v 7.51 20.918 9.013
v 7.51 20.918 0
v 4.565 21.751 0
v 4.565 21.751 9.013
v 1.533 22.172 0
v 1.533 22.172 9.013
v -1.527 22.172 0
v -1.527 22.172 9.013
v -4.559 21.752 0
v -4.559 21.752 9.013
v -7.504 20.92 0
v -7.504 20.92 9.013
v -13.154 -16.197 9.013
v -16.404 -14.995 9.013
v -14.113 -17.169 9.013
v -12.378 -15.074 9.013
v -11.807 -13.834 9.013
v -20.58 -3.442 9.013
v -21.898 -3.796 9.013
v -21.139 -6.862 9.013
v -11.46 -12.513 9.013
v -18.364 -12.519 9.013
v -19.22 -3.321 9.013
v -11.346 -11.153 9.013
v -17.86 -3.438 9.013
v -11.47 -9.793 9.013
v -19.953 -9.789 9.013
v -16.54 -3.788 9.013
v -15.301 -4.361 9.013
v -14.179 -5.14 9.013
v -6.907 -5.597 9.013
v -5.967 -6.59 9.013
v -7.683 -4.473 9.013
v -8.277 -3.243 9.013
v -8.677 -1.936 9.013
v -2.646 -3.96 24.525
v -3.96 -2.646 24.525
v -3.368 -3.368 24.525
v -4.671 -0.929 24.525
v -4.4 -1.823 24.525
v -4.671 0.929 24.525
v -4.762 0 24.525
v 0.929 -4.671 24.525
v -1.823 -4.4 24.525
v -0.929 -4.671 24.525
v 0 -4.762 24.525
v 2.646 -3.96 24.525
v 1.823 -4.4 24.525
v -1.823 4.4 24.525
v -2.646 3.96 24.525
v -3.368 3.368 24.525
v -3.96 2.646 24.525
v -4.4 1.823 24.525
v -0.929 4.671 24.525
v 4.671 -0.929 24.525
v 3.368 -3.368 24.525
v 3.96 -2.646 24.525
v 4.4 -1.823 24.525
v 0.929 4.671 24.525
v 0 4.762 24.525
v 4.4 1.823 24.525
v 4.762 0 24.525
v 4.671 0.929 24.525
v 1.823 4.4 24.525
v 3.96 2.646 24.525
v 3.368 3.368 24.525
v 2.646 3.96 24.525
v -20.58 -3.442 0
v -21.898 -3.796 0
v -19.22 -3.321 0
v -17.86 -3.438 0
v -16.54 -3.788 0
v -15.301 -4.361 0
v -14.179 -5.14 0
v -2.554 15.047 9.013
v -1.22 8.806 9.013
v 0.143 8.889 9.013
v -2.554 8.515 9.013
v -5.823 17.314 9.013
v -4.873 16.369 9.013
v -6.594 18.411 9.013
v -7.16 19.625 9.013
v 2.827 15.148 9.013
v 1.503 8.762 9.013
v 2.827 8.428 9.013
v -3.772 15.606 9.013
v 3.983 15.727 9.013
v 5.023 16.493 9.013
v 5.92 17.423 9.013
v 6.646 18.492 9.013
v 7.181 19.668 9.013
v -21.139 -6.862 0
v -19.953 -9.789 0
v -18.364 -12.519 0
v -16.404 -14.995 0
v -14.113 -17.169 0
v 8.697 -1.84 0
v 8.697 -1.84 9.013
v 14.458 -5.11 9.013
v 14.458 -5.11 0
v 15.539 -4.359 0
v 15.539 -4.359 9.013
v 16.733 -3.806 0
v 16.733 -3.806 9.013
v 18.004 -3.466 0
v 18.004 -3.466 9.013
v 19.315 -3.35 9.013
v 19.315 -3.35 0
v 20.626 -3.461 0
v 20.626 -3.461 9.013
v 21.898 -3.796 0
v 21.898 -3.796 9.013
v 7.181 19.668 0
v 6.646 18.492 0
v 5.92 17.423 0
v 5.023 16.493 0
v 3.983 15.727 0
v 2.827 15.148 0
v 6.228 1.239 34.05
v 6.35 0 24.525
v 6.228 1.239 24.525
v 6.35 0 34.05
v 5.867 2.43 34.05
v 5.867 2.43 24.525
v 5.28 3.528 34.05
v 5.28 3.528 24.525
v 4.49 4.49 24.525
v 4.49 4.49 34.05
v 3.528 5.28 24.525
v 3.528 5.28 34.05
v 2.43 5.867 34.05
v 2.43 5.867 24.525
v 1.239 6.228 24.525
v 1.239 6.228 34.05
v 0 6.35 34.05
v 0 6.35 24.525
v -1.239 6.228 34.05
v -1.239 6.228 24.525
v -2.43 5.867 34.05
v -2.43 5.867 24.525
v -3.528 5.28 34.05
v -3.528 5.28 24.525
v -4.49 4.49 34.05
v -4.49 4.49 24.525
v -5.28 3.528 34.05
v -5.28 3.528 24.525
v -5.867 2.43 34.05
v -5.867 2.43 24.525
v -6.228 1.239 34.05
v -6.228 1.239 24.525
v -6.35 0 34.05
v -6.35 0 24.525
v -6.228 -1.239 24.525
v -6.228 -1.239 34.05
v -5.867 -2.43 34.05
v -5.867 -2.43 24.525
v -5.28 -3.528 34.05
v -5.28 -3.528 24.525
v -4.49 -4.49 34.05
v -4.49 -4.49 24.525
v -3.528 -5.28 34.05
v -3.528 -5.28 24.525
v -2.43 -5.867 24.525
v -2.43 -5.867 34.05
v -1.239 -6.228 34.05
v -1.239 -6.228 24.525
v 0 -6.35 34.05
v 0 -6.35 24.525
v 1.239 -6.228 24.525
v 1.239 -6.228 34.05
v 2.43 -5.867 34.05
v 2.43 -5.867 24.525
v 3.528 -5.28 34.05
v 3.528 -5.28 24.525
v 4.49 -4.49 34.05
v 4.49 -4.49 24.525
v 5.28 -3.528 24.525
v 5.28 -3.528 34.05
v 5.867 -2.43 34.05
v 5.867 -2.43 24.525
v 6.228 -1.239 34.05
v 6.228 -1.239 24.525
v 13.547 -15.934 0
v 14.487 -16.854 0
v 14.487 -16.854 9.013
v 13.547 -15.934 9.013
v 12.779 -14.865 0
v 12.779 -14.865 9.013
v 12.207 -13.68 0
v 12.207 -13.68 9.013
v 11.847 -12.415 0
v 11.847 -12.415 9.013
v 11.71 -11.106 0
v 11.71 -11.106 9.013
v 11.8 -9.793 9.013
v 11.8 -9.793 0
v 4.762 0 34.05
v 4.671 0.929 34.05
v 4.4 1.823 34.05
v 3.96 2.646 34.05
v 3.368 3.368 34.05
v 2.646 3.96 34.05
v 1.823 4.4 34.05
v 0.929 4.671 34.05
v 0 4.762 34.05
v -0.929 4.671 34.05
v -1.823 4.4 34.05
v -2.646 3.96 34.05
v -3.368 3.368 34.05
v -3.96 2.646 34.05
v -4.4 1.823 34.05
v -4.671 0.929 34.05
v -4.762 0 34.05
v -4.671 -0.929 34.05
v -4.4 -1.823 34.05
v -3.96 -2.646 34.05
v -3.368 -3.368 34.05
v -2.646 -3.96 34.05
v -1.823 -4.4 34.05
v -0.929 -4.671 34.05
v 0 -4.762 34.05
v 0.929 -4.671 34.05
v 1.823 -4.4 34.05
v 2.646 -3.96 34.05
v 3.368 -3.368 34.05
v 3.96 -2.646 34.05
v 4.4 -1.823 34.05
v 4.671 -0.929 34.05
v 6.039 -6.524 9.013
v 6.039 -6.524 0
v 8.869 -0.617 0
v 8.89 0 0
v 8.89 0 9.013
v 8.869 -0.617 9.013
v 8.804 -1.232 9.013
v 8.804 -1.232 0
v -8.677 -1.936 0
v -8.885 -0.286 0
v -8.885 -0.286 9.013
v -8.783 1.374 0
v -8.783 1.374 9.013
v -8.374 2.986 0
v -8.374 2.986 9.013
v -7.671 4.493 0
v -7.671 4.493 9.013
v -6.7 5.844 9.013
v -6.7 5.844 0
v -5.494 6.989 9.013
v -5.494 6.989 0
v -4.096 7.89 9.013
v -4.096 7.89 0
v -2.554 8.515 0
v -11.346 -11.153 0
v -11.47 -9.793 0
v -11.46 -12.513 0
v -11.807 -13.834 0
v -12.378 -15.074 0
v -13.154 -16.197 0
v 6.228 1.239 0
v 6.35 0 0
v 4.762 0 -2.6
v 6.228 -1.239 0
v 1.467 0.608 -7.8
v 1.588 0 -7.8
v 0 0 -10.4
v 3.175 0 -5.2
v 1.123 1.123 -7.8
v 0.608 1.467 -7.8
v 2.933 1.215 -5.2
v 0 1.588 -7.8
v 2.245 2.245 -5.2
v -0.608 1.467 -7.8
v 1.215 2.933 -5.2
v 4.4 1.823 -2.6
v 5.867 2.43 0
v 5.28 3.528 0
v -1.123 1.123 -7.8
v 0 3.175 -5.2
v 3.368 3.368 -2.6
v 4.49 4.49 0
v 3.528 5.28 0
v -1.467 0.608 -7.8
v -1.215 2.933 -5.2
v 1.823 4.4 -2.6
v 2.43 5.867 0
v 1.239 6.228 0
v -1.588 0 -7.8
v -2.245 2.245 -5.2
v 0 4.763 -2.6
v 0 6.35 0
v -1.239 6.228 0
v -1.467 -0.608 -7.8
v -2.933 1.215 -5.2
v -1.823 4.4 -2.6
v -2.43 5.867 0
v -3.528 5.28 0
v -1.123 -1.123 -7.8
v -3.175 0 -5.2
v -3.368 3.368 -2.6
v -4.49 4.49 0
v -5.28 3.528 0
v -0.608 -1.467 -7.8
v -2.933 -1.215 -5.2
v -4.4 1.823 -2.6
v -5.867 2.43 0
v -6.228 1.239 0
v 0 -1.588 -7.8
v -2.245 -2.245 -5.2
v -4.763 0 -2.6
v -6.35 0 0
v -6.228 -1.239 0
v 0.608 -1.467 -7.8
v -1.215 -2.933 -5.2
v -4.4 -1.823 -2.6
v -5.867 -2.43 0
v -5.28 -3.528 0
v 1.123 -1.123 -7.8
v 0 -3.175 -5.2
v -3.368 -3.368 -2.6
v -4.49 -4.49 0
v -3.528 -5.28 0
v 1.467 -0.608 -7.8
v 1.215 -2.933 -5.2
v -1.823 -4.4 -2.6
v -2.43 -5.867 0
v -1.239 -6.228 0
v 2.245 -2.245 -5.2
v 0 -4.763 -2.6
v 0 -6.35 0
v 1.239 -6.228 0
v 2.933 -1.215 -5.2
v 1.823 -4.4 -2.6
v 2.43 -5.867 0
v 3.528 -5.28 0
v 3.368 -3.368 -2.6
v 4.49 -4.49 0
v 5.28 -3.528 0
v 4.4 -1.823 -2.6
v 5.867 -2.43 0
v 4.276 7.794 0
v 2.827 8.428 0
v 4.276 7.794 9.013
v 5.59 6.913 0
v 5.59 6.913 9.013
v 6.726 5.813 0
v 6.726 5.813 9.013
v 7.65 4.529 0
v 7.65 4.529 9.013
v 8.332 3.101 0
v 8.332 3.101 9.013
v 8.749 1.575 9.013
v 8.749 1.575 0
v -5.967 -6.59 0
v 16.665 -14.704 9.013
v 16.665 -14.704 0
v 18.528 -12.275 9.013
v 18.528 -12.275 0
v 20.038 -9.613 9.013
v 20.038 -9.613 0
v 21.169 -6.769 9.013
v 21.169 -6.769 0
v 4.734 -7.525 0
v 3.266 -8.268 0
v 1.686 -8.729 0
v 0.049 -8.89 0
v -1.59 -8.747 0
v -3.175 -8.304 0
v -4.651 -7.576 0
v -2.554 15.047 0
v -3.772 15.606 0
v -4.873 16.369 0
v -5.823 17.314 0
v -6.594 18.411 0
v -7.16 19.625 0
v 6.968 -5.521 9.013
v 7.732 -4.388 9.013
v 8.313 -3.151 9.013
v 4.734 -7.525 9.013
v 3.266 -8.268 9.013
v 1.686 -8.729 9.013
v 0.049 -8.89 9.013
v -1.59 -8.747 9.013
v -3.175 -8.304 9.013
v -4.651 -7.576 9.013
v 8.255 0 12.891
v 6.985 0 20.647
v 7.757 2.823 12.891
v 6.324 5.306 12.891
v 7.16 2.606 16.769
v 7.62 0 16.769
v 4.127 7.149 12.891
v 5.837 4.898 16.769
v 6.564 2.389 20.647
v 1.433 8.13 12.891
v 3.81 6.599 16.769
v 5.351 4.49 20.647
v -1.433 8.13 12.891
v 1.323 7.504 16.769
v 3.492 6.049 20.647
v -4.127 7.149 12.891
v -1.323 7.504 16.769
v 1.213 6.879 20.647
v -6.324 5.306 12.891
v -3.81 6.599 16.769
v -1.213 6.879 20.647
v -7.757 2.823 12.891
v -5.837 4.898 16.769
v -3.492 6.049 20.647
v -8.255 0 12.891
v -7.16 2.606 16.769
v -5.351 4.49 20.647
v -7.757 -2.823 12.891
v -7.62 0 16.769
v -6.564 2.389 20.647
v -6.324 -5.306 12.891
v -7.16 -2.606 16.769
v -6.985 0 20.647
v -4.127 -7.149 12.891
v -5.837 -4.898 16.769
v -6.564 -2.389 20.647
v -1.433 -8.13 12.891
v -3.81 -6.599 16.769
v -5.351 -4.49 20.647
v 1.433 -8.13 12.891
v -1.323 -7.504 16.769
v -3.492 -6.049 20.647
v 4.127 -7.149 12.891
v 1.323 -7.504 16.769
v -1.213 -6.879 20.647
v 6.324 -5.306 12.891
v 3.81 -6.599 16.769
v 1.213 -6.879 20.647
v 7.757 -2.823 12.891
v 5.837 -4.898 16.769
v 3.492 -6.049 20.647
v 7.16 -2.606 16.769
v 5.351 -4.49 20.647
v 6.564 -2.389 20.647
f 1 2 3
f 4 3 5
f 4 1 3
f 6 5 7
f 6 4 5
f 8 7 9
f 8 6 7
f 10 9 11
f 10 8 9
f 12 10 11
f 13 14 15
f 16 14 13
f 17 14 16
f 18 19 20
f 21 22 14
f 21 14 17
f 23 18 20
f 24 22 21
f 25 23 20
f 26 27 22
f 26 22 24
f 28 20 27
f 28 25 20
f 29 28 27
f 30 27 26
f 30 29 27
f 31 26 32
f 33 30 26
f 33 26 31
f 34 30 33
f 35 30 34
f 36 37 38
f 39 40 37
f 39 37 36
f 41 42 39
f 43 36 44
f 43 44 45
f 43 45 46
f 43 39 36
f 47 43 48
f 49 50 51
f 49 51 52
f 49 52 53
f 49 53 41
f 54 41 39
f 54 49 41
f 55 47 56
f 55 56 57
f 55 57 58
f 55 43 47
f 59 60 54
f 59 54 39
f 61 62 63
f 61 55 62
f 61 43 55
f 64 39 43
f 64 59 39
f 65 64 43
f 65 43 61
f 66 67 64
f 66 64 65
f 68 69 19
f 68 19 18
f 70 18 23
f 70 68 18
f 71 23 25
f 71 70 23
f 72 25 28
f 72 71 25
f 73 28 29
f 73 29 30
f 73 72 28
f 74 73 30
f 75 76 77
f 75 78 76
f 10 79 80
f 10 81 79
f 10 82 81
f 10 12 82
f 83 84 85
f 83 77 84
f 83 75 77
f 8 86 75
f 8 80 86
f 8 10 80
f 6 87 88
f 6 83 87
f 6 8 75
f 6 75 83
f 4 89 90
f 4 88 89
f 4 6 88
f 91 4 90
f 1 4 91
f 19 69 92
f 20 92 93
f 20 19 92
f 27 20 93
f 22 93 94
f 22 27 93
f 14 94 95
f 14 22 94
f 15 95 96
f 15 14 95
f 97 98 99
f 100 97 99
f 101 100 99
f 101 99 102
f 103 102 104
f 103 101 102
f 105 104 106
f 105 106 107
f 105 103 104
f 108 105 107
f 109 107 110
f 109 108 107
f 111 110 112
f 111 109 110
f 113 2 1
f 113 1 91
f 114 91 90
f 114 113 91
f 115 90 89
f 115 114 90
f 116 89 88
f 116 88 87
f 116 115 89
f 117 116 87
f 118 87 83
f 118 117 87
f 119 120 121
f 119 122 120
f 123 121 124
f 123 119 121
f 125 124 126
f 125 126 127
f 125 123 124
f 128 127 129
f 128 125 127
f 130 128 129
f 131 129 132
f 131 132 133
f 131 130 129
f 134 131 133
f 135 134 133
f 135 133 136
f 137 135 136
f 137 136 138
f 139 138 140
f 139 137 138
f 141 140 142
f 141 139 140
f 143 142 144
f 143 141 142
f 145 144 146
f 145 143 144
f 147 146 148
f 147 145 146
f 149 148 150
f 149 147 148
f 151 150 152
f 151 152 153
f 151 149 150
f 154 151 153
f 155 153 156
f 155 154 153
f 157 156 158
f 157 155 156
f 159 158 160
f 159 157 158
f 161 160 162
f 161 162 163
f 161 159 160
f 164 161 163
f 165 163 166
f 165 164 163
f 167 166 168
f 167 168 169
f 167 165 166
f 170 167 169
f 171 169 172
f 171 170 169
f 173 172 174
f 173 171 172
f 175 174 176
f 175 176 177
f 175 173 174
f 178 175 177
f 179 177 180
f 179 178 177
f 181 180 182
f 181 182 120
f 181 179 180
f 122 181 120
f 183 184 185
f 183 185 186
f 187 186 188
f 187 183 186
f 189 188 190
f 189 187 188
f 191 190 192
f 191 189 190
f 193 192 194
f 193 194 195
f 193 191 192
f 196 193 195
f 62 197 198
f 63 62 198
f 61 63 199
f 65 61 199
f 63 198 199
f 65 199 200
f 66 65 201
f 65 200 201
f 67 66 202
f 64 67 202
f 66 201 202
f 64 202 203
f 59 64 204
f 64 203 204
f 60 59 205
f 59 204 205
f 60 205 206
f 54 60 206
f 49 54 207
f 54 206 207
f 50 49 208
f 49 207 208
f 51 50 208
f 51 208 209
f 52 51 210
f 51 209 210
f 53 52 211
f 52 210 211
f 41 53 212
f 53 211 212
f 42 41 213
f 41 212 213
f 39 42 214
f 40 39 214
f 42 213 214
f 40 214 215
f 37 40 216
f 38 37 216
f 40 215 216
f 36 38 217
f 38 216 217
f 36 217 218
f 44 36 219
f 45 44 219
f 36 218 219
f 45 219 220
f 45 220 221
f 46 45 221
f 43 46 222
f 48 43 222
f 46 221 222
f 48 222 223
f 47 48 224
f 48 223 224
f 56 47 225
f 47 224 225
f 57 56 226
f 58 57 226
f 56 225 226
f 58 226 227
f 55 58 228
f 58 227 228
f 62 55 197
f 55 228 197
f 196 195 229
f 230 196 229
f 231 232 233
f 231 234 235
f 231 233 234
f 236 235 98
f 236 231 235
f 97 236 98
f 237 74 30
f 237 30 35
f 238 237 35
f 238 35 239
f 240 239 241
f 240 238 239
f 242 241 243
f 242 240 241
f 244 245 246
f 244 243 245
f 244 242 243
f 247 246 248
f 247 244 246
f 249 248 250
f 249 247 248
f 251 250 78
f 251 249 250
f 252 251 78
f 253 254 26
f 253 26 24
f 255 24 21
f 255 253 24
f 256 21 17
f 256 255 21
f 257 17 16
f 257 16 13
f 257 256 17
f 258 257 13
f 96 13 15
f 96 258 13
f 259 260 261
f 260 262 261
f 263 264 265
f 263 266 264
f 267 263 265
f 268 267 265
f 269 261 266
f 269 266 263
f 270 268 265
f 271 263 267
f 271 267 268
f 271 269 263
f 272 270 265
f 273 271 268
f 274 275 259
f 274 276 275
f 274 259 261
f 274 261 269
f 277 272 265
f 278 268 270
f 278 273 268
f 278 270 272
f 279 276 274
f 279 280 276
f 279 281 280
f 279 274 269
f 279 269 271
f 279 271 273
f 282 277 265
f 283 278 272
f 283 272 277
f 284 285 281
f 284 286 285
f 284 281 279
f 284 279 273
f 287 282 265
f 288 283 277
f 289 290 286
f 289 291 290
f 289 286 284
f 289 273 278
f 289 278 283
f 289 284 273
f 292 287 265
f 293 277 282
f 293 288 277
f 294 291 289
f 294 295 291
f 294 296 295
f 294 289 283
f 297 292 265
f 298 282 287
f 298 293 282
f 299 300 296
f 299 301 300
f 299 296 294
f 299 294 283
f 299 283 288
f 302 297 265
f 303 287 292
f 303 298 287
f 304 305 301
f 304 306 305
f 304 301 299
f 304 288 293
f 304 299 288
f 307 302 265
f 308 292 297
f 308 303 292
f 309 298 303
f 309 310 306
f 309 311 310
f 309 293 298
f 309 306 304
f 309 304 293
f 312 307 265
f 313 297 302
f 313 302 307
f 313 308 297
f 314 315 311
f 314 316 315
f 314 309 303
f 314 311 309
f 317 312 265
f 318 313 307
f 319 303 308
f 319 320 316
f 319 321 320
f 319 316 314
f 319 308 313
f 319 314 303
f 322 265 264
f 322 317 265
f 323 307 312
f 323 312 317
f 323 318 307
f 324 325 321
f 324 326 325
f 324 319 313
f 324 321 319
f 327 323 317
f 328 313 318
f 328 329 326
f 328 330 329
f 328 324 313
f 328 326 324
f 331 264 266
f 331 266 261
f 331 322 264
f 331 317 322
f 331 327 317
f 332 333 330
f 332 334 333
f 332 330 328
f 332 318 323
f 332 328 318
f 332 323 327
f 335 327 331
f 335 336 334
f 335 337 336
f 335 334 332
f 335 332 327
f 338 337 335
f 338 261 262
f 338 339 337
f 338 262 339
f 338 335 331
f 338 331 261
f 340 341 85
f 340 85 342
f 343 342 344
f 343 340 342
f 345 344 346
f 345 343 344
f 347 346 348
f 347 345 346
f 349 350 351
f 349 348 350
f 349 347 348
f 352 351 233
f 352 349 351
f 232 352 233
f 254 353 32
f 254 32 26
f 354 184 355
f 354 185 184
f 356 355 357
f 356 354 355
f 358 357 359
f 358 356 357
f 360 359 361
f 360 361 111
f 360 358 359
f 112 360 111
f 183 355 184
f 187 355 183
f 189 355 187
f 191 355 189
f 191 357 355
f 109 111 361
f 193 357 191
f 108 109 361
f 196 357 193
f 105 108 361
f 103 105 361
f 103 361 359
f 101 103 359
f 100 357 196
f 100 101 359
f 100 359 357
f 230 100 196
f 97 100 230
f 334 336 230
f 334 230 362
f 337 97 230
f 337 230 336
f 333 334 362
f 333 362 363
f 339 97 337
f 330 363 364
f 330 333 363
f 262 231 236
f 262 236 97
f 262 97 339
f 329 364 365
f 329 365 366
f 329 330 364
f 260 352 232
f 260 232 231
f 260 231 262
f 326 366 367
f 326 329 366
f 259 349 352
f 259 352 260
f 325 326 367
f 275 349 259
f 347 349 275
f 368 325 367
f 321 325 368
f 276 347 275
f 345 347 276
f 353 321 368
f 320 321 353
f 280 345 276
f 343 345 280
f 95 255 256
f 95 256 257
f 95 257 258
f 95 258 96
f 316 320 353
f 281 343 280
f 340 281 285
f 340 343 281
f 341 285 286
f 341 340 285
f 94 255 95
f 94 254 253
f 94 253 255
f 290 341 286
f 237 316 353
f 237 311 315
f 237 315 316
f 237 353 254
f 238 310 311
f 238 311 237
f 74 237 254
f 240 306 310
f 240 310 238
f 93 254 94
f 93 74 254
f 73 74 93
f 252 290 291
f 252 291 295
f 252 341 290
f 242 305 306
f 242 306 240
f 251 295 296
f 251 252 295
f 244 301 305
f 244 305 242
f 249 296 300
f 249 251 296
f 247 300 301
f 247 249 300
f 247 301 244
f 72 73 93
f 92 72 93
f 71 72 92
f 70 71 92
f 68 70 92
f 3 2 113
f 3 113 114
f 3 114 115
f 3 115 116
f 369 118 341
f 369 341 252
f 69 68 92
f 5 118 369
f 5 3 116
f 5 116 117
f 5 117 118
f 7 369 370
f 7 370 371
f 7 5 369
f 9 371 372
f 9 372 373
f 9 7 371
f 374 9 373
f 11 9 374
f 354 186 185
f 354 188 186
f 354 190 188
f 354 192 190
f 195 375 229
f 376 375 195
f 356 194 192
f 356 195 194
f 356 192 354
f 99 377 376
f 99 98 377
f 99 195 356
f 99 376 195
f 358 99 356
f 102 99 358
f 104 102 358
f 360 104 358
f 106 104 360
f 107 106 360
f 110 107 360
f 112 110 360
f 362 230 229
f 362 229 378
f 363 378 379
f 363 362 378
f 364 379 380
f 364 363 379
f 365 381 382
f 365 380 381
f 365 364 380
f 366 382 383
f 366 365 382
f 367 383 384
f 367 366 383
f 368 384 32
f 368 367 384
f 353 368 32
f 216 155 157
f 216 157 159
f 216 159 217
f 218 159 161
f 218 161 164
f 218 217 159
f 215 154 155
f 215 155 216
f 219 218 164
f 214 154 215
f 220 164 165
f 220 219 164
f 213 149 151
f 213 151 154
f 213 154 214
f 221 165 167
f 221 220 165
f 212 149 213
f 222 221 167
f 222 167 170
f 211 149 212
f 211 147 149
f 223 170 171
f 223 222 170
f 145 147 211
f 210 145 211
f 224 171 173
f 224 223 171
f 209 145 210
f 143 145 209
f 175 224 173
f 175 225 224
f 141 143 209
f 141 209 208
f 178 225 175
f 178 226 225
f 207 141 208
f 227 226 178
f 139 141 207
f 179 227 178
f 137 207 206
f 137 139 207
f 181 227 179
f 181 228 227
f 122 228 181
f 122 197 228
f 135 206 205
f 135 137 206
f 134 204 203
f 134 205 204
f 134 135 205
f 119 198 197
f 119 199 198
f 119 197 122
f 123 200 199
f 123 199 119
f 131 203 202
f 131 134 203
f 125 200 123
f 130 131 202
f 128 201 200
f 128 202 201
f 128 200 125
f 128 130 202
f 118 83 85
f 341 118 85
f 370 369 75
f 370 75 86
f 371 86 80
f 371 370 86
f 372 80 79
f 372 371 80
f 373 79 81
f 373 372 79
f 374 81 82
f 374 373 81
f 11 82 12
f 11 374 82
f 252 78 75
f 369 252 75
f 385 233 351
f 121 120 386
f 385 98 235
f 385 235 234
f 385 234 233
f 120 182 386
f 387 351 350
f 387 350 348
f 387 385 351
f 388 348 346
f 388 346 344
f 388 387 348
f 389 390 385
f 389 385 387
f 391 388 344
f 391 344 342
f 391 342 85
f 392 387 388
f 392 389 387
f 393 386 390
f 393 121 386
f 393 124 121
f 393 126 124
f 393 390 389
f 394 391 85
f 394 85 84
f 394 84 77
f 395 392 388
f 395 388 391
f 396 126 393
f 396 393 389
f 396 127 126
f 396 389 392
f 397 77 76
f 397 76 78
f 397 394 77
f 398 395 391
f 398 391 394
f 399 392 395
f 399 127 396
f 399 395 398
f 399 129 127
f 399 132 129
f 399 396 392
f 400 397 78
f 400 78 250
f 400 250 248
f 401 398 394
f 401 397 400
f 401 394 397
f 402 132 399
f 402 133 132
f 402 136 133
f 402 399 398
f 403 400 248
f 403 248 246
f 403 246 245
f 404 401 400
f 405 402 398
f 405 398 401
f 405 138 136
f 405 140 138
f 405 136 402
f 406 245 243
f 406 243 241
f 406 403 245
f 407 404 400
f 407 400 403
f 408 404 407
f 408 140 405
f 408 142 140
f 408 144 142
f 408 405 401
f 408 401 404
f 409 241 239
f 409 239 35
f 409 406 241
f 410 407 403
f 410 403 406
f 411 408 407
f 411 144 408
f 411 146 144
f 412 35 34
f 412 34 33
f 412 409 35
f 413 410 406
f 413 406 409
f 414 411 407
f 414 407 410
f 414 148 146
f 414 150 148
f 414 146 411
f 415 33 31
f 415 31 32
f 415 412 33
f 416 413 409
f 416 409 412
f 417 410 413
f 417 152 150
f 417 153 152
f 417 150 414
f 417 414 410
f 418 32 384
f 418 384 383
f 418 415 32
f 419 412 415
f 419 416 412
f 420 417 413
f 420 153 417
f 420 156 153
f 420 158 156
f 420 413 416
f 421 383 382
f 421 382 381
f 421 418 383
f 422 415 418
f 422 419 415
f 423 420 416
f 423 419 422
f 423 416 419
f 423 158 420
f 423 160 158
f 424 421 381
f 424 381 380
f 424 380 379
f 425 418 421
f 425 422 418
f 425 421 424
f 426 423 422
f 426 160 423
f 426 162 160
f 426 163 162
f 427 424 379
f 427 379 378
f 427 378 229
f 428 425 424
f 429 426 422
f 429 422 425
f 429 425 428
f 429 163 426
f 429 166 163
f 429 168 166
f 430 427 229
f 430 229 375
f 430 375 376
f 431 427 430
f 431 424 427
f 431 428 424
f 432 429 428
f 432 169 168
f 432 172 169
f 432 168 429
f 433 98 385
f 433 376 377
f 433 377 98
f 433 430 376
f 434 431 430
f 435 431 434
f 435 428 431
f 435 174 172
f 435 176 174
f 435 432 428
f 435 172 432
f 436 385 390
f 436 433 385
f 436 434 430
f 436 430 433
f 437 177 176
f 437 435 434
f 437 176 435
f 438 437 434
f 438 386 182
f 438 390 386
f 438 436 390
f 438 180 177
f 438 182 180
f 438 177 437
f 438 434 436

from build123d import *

# Parameters (mm, degrees)
F3_DEPTH = 14.097
F4_R     = 4.7625
F5_DEPTH = 9.525


with BuildPart() as f1:
    # F0 (on Front) → F1 (revolve)
    with BuildSketch(Plane.XZ):
        Polygon((6.35, 24.5250865847), (6.35, 34.0500865847), (0, 34.0500865847), (0, -10.3999134153), (6.35, 0), (22.225, 0), (22.225, 9.0132579207), (8.8899998294, 9.0132579207), align=None)
    revolve(axis=Axis((0, 0, 11.8250865847), (0, 0, 1)))

    # F2 (on Top) → F3 (cut)
    with BuildSketch(Plane.XY):
        with BuildLine():
            ThreePointArc((-14.113121628, -17.1688794892), (0.2443956371, -22.2236562197), (14.487278372, -16.8543582011))
            ThreePointArc((14.487278372, -16.8543582011), (12.207059324, -13.6802064233), (11.8003316443, -9.7931495662))
            Line((11.8003316443, -9.7931495662), (6.0394839652, -6.5235522098))
            ThreePointArc((6.0394839652, -6.5235522098), (0.0488798663, -8.889865621), (-5.9673830231, -6.5895705365))
            Line((-5.9673830231, -6.5895705365), (-11.470085079, -9.7931648991))
            ThreePointArc((-11.470085079, -9.7931648991), (-11.8071714813, -13.8337865787), (-14.113121628, -17.1688794892))
        make_face()
        with BuildLine():
            ThreePointArc((21.8983417722, -3.7964789779), (22.1431848532, -1.9052531477), (22.225, 0))
            ThreePointArc((22.225, 0), (18.1777280494, 12.7875262644), (7.5099648628, 20.9177210221))
            ThreePointArc((7.5099648628, 20.9177210221), (5.9196955053, 17.4232913204), (2.8274223411, 15.1478040653))
            Line((2.8274223411, 15.1478040653), (2.8274223411, 8.4283914779))
            ThreePointArc((2.8274223411, 8.4283914779), (7.2169205556, 5.1911614976), (8.89, 0))
            ThreePointArc((8.89, 0), (8.8417204308, -0.9252458182), (8.6974061138, -1.8404420369))
            Line((8.6974061138, -1.8404420369), (14.4582537929, -5.1100393933))
            ThreePointArc((14.4582537929, -5.1100393933), (18.0040397888, -3.4662510593), (21.8983417722, -3.7964789779))
        make_face()
        with BuildLine():
            ThreePointArc((-2.5544860487, 15.0469797465), (-5.8234880662, 17.3140797385), (-7.5044304492, 20.9197071833))
            ThreePointArc((-7.5044304492, 20.9197071833), (-19.2055517537, 11.1846952054), (-21.8983417722, -3.7964789779))
            ThreePointArc((-21.8983417722, -3.7964789779), (-17.8595819955, -3.4377725991), (-14.1793440119, -5.1395655315))
            Line((-14.1793440119, -5.1395655315), (-8.676641956, -1.9359711689))
            ThreePointArc((-8.676641956, -1.9359711689), (-7.6707699458, 4.4934828851), (-2.5544860487, 8.5150866717))
            Line((-2.5544860487, 8.5150866717), (-2.5544860487, 15.0469797465))
        make_face()
    extrude(amount=F3_DEPTH, mode=Mode.SUBTRACT)

    # F4 (on face) → F5 (cut)
    with BuildSketch(Plane.XY.offset(34.0500865847)):
        Circle(F4_R)
    extrude(amount=-F5_DEPTH, mode=Mode.SUBTRACT)


solid = f1.part
